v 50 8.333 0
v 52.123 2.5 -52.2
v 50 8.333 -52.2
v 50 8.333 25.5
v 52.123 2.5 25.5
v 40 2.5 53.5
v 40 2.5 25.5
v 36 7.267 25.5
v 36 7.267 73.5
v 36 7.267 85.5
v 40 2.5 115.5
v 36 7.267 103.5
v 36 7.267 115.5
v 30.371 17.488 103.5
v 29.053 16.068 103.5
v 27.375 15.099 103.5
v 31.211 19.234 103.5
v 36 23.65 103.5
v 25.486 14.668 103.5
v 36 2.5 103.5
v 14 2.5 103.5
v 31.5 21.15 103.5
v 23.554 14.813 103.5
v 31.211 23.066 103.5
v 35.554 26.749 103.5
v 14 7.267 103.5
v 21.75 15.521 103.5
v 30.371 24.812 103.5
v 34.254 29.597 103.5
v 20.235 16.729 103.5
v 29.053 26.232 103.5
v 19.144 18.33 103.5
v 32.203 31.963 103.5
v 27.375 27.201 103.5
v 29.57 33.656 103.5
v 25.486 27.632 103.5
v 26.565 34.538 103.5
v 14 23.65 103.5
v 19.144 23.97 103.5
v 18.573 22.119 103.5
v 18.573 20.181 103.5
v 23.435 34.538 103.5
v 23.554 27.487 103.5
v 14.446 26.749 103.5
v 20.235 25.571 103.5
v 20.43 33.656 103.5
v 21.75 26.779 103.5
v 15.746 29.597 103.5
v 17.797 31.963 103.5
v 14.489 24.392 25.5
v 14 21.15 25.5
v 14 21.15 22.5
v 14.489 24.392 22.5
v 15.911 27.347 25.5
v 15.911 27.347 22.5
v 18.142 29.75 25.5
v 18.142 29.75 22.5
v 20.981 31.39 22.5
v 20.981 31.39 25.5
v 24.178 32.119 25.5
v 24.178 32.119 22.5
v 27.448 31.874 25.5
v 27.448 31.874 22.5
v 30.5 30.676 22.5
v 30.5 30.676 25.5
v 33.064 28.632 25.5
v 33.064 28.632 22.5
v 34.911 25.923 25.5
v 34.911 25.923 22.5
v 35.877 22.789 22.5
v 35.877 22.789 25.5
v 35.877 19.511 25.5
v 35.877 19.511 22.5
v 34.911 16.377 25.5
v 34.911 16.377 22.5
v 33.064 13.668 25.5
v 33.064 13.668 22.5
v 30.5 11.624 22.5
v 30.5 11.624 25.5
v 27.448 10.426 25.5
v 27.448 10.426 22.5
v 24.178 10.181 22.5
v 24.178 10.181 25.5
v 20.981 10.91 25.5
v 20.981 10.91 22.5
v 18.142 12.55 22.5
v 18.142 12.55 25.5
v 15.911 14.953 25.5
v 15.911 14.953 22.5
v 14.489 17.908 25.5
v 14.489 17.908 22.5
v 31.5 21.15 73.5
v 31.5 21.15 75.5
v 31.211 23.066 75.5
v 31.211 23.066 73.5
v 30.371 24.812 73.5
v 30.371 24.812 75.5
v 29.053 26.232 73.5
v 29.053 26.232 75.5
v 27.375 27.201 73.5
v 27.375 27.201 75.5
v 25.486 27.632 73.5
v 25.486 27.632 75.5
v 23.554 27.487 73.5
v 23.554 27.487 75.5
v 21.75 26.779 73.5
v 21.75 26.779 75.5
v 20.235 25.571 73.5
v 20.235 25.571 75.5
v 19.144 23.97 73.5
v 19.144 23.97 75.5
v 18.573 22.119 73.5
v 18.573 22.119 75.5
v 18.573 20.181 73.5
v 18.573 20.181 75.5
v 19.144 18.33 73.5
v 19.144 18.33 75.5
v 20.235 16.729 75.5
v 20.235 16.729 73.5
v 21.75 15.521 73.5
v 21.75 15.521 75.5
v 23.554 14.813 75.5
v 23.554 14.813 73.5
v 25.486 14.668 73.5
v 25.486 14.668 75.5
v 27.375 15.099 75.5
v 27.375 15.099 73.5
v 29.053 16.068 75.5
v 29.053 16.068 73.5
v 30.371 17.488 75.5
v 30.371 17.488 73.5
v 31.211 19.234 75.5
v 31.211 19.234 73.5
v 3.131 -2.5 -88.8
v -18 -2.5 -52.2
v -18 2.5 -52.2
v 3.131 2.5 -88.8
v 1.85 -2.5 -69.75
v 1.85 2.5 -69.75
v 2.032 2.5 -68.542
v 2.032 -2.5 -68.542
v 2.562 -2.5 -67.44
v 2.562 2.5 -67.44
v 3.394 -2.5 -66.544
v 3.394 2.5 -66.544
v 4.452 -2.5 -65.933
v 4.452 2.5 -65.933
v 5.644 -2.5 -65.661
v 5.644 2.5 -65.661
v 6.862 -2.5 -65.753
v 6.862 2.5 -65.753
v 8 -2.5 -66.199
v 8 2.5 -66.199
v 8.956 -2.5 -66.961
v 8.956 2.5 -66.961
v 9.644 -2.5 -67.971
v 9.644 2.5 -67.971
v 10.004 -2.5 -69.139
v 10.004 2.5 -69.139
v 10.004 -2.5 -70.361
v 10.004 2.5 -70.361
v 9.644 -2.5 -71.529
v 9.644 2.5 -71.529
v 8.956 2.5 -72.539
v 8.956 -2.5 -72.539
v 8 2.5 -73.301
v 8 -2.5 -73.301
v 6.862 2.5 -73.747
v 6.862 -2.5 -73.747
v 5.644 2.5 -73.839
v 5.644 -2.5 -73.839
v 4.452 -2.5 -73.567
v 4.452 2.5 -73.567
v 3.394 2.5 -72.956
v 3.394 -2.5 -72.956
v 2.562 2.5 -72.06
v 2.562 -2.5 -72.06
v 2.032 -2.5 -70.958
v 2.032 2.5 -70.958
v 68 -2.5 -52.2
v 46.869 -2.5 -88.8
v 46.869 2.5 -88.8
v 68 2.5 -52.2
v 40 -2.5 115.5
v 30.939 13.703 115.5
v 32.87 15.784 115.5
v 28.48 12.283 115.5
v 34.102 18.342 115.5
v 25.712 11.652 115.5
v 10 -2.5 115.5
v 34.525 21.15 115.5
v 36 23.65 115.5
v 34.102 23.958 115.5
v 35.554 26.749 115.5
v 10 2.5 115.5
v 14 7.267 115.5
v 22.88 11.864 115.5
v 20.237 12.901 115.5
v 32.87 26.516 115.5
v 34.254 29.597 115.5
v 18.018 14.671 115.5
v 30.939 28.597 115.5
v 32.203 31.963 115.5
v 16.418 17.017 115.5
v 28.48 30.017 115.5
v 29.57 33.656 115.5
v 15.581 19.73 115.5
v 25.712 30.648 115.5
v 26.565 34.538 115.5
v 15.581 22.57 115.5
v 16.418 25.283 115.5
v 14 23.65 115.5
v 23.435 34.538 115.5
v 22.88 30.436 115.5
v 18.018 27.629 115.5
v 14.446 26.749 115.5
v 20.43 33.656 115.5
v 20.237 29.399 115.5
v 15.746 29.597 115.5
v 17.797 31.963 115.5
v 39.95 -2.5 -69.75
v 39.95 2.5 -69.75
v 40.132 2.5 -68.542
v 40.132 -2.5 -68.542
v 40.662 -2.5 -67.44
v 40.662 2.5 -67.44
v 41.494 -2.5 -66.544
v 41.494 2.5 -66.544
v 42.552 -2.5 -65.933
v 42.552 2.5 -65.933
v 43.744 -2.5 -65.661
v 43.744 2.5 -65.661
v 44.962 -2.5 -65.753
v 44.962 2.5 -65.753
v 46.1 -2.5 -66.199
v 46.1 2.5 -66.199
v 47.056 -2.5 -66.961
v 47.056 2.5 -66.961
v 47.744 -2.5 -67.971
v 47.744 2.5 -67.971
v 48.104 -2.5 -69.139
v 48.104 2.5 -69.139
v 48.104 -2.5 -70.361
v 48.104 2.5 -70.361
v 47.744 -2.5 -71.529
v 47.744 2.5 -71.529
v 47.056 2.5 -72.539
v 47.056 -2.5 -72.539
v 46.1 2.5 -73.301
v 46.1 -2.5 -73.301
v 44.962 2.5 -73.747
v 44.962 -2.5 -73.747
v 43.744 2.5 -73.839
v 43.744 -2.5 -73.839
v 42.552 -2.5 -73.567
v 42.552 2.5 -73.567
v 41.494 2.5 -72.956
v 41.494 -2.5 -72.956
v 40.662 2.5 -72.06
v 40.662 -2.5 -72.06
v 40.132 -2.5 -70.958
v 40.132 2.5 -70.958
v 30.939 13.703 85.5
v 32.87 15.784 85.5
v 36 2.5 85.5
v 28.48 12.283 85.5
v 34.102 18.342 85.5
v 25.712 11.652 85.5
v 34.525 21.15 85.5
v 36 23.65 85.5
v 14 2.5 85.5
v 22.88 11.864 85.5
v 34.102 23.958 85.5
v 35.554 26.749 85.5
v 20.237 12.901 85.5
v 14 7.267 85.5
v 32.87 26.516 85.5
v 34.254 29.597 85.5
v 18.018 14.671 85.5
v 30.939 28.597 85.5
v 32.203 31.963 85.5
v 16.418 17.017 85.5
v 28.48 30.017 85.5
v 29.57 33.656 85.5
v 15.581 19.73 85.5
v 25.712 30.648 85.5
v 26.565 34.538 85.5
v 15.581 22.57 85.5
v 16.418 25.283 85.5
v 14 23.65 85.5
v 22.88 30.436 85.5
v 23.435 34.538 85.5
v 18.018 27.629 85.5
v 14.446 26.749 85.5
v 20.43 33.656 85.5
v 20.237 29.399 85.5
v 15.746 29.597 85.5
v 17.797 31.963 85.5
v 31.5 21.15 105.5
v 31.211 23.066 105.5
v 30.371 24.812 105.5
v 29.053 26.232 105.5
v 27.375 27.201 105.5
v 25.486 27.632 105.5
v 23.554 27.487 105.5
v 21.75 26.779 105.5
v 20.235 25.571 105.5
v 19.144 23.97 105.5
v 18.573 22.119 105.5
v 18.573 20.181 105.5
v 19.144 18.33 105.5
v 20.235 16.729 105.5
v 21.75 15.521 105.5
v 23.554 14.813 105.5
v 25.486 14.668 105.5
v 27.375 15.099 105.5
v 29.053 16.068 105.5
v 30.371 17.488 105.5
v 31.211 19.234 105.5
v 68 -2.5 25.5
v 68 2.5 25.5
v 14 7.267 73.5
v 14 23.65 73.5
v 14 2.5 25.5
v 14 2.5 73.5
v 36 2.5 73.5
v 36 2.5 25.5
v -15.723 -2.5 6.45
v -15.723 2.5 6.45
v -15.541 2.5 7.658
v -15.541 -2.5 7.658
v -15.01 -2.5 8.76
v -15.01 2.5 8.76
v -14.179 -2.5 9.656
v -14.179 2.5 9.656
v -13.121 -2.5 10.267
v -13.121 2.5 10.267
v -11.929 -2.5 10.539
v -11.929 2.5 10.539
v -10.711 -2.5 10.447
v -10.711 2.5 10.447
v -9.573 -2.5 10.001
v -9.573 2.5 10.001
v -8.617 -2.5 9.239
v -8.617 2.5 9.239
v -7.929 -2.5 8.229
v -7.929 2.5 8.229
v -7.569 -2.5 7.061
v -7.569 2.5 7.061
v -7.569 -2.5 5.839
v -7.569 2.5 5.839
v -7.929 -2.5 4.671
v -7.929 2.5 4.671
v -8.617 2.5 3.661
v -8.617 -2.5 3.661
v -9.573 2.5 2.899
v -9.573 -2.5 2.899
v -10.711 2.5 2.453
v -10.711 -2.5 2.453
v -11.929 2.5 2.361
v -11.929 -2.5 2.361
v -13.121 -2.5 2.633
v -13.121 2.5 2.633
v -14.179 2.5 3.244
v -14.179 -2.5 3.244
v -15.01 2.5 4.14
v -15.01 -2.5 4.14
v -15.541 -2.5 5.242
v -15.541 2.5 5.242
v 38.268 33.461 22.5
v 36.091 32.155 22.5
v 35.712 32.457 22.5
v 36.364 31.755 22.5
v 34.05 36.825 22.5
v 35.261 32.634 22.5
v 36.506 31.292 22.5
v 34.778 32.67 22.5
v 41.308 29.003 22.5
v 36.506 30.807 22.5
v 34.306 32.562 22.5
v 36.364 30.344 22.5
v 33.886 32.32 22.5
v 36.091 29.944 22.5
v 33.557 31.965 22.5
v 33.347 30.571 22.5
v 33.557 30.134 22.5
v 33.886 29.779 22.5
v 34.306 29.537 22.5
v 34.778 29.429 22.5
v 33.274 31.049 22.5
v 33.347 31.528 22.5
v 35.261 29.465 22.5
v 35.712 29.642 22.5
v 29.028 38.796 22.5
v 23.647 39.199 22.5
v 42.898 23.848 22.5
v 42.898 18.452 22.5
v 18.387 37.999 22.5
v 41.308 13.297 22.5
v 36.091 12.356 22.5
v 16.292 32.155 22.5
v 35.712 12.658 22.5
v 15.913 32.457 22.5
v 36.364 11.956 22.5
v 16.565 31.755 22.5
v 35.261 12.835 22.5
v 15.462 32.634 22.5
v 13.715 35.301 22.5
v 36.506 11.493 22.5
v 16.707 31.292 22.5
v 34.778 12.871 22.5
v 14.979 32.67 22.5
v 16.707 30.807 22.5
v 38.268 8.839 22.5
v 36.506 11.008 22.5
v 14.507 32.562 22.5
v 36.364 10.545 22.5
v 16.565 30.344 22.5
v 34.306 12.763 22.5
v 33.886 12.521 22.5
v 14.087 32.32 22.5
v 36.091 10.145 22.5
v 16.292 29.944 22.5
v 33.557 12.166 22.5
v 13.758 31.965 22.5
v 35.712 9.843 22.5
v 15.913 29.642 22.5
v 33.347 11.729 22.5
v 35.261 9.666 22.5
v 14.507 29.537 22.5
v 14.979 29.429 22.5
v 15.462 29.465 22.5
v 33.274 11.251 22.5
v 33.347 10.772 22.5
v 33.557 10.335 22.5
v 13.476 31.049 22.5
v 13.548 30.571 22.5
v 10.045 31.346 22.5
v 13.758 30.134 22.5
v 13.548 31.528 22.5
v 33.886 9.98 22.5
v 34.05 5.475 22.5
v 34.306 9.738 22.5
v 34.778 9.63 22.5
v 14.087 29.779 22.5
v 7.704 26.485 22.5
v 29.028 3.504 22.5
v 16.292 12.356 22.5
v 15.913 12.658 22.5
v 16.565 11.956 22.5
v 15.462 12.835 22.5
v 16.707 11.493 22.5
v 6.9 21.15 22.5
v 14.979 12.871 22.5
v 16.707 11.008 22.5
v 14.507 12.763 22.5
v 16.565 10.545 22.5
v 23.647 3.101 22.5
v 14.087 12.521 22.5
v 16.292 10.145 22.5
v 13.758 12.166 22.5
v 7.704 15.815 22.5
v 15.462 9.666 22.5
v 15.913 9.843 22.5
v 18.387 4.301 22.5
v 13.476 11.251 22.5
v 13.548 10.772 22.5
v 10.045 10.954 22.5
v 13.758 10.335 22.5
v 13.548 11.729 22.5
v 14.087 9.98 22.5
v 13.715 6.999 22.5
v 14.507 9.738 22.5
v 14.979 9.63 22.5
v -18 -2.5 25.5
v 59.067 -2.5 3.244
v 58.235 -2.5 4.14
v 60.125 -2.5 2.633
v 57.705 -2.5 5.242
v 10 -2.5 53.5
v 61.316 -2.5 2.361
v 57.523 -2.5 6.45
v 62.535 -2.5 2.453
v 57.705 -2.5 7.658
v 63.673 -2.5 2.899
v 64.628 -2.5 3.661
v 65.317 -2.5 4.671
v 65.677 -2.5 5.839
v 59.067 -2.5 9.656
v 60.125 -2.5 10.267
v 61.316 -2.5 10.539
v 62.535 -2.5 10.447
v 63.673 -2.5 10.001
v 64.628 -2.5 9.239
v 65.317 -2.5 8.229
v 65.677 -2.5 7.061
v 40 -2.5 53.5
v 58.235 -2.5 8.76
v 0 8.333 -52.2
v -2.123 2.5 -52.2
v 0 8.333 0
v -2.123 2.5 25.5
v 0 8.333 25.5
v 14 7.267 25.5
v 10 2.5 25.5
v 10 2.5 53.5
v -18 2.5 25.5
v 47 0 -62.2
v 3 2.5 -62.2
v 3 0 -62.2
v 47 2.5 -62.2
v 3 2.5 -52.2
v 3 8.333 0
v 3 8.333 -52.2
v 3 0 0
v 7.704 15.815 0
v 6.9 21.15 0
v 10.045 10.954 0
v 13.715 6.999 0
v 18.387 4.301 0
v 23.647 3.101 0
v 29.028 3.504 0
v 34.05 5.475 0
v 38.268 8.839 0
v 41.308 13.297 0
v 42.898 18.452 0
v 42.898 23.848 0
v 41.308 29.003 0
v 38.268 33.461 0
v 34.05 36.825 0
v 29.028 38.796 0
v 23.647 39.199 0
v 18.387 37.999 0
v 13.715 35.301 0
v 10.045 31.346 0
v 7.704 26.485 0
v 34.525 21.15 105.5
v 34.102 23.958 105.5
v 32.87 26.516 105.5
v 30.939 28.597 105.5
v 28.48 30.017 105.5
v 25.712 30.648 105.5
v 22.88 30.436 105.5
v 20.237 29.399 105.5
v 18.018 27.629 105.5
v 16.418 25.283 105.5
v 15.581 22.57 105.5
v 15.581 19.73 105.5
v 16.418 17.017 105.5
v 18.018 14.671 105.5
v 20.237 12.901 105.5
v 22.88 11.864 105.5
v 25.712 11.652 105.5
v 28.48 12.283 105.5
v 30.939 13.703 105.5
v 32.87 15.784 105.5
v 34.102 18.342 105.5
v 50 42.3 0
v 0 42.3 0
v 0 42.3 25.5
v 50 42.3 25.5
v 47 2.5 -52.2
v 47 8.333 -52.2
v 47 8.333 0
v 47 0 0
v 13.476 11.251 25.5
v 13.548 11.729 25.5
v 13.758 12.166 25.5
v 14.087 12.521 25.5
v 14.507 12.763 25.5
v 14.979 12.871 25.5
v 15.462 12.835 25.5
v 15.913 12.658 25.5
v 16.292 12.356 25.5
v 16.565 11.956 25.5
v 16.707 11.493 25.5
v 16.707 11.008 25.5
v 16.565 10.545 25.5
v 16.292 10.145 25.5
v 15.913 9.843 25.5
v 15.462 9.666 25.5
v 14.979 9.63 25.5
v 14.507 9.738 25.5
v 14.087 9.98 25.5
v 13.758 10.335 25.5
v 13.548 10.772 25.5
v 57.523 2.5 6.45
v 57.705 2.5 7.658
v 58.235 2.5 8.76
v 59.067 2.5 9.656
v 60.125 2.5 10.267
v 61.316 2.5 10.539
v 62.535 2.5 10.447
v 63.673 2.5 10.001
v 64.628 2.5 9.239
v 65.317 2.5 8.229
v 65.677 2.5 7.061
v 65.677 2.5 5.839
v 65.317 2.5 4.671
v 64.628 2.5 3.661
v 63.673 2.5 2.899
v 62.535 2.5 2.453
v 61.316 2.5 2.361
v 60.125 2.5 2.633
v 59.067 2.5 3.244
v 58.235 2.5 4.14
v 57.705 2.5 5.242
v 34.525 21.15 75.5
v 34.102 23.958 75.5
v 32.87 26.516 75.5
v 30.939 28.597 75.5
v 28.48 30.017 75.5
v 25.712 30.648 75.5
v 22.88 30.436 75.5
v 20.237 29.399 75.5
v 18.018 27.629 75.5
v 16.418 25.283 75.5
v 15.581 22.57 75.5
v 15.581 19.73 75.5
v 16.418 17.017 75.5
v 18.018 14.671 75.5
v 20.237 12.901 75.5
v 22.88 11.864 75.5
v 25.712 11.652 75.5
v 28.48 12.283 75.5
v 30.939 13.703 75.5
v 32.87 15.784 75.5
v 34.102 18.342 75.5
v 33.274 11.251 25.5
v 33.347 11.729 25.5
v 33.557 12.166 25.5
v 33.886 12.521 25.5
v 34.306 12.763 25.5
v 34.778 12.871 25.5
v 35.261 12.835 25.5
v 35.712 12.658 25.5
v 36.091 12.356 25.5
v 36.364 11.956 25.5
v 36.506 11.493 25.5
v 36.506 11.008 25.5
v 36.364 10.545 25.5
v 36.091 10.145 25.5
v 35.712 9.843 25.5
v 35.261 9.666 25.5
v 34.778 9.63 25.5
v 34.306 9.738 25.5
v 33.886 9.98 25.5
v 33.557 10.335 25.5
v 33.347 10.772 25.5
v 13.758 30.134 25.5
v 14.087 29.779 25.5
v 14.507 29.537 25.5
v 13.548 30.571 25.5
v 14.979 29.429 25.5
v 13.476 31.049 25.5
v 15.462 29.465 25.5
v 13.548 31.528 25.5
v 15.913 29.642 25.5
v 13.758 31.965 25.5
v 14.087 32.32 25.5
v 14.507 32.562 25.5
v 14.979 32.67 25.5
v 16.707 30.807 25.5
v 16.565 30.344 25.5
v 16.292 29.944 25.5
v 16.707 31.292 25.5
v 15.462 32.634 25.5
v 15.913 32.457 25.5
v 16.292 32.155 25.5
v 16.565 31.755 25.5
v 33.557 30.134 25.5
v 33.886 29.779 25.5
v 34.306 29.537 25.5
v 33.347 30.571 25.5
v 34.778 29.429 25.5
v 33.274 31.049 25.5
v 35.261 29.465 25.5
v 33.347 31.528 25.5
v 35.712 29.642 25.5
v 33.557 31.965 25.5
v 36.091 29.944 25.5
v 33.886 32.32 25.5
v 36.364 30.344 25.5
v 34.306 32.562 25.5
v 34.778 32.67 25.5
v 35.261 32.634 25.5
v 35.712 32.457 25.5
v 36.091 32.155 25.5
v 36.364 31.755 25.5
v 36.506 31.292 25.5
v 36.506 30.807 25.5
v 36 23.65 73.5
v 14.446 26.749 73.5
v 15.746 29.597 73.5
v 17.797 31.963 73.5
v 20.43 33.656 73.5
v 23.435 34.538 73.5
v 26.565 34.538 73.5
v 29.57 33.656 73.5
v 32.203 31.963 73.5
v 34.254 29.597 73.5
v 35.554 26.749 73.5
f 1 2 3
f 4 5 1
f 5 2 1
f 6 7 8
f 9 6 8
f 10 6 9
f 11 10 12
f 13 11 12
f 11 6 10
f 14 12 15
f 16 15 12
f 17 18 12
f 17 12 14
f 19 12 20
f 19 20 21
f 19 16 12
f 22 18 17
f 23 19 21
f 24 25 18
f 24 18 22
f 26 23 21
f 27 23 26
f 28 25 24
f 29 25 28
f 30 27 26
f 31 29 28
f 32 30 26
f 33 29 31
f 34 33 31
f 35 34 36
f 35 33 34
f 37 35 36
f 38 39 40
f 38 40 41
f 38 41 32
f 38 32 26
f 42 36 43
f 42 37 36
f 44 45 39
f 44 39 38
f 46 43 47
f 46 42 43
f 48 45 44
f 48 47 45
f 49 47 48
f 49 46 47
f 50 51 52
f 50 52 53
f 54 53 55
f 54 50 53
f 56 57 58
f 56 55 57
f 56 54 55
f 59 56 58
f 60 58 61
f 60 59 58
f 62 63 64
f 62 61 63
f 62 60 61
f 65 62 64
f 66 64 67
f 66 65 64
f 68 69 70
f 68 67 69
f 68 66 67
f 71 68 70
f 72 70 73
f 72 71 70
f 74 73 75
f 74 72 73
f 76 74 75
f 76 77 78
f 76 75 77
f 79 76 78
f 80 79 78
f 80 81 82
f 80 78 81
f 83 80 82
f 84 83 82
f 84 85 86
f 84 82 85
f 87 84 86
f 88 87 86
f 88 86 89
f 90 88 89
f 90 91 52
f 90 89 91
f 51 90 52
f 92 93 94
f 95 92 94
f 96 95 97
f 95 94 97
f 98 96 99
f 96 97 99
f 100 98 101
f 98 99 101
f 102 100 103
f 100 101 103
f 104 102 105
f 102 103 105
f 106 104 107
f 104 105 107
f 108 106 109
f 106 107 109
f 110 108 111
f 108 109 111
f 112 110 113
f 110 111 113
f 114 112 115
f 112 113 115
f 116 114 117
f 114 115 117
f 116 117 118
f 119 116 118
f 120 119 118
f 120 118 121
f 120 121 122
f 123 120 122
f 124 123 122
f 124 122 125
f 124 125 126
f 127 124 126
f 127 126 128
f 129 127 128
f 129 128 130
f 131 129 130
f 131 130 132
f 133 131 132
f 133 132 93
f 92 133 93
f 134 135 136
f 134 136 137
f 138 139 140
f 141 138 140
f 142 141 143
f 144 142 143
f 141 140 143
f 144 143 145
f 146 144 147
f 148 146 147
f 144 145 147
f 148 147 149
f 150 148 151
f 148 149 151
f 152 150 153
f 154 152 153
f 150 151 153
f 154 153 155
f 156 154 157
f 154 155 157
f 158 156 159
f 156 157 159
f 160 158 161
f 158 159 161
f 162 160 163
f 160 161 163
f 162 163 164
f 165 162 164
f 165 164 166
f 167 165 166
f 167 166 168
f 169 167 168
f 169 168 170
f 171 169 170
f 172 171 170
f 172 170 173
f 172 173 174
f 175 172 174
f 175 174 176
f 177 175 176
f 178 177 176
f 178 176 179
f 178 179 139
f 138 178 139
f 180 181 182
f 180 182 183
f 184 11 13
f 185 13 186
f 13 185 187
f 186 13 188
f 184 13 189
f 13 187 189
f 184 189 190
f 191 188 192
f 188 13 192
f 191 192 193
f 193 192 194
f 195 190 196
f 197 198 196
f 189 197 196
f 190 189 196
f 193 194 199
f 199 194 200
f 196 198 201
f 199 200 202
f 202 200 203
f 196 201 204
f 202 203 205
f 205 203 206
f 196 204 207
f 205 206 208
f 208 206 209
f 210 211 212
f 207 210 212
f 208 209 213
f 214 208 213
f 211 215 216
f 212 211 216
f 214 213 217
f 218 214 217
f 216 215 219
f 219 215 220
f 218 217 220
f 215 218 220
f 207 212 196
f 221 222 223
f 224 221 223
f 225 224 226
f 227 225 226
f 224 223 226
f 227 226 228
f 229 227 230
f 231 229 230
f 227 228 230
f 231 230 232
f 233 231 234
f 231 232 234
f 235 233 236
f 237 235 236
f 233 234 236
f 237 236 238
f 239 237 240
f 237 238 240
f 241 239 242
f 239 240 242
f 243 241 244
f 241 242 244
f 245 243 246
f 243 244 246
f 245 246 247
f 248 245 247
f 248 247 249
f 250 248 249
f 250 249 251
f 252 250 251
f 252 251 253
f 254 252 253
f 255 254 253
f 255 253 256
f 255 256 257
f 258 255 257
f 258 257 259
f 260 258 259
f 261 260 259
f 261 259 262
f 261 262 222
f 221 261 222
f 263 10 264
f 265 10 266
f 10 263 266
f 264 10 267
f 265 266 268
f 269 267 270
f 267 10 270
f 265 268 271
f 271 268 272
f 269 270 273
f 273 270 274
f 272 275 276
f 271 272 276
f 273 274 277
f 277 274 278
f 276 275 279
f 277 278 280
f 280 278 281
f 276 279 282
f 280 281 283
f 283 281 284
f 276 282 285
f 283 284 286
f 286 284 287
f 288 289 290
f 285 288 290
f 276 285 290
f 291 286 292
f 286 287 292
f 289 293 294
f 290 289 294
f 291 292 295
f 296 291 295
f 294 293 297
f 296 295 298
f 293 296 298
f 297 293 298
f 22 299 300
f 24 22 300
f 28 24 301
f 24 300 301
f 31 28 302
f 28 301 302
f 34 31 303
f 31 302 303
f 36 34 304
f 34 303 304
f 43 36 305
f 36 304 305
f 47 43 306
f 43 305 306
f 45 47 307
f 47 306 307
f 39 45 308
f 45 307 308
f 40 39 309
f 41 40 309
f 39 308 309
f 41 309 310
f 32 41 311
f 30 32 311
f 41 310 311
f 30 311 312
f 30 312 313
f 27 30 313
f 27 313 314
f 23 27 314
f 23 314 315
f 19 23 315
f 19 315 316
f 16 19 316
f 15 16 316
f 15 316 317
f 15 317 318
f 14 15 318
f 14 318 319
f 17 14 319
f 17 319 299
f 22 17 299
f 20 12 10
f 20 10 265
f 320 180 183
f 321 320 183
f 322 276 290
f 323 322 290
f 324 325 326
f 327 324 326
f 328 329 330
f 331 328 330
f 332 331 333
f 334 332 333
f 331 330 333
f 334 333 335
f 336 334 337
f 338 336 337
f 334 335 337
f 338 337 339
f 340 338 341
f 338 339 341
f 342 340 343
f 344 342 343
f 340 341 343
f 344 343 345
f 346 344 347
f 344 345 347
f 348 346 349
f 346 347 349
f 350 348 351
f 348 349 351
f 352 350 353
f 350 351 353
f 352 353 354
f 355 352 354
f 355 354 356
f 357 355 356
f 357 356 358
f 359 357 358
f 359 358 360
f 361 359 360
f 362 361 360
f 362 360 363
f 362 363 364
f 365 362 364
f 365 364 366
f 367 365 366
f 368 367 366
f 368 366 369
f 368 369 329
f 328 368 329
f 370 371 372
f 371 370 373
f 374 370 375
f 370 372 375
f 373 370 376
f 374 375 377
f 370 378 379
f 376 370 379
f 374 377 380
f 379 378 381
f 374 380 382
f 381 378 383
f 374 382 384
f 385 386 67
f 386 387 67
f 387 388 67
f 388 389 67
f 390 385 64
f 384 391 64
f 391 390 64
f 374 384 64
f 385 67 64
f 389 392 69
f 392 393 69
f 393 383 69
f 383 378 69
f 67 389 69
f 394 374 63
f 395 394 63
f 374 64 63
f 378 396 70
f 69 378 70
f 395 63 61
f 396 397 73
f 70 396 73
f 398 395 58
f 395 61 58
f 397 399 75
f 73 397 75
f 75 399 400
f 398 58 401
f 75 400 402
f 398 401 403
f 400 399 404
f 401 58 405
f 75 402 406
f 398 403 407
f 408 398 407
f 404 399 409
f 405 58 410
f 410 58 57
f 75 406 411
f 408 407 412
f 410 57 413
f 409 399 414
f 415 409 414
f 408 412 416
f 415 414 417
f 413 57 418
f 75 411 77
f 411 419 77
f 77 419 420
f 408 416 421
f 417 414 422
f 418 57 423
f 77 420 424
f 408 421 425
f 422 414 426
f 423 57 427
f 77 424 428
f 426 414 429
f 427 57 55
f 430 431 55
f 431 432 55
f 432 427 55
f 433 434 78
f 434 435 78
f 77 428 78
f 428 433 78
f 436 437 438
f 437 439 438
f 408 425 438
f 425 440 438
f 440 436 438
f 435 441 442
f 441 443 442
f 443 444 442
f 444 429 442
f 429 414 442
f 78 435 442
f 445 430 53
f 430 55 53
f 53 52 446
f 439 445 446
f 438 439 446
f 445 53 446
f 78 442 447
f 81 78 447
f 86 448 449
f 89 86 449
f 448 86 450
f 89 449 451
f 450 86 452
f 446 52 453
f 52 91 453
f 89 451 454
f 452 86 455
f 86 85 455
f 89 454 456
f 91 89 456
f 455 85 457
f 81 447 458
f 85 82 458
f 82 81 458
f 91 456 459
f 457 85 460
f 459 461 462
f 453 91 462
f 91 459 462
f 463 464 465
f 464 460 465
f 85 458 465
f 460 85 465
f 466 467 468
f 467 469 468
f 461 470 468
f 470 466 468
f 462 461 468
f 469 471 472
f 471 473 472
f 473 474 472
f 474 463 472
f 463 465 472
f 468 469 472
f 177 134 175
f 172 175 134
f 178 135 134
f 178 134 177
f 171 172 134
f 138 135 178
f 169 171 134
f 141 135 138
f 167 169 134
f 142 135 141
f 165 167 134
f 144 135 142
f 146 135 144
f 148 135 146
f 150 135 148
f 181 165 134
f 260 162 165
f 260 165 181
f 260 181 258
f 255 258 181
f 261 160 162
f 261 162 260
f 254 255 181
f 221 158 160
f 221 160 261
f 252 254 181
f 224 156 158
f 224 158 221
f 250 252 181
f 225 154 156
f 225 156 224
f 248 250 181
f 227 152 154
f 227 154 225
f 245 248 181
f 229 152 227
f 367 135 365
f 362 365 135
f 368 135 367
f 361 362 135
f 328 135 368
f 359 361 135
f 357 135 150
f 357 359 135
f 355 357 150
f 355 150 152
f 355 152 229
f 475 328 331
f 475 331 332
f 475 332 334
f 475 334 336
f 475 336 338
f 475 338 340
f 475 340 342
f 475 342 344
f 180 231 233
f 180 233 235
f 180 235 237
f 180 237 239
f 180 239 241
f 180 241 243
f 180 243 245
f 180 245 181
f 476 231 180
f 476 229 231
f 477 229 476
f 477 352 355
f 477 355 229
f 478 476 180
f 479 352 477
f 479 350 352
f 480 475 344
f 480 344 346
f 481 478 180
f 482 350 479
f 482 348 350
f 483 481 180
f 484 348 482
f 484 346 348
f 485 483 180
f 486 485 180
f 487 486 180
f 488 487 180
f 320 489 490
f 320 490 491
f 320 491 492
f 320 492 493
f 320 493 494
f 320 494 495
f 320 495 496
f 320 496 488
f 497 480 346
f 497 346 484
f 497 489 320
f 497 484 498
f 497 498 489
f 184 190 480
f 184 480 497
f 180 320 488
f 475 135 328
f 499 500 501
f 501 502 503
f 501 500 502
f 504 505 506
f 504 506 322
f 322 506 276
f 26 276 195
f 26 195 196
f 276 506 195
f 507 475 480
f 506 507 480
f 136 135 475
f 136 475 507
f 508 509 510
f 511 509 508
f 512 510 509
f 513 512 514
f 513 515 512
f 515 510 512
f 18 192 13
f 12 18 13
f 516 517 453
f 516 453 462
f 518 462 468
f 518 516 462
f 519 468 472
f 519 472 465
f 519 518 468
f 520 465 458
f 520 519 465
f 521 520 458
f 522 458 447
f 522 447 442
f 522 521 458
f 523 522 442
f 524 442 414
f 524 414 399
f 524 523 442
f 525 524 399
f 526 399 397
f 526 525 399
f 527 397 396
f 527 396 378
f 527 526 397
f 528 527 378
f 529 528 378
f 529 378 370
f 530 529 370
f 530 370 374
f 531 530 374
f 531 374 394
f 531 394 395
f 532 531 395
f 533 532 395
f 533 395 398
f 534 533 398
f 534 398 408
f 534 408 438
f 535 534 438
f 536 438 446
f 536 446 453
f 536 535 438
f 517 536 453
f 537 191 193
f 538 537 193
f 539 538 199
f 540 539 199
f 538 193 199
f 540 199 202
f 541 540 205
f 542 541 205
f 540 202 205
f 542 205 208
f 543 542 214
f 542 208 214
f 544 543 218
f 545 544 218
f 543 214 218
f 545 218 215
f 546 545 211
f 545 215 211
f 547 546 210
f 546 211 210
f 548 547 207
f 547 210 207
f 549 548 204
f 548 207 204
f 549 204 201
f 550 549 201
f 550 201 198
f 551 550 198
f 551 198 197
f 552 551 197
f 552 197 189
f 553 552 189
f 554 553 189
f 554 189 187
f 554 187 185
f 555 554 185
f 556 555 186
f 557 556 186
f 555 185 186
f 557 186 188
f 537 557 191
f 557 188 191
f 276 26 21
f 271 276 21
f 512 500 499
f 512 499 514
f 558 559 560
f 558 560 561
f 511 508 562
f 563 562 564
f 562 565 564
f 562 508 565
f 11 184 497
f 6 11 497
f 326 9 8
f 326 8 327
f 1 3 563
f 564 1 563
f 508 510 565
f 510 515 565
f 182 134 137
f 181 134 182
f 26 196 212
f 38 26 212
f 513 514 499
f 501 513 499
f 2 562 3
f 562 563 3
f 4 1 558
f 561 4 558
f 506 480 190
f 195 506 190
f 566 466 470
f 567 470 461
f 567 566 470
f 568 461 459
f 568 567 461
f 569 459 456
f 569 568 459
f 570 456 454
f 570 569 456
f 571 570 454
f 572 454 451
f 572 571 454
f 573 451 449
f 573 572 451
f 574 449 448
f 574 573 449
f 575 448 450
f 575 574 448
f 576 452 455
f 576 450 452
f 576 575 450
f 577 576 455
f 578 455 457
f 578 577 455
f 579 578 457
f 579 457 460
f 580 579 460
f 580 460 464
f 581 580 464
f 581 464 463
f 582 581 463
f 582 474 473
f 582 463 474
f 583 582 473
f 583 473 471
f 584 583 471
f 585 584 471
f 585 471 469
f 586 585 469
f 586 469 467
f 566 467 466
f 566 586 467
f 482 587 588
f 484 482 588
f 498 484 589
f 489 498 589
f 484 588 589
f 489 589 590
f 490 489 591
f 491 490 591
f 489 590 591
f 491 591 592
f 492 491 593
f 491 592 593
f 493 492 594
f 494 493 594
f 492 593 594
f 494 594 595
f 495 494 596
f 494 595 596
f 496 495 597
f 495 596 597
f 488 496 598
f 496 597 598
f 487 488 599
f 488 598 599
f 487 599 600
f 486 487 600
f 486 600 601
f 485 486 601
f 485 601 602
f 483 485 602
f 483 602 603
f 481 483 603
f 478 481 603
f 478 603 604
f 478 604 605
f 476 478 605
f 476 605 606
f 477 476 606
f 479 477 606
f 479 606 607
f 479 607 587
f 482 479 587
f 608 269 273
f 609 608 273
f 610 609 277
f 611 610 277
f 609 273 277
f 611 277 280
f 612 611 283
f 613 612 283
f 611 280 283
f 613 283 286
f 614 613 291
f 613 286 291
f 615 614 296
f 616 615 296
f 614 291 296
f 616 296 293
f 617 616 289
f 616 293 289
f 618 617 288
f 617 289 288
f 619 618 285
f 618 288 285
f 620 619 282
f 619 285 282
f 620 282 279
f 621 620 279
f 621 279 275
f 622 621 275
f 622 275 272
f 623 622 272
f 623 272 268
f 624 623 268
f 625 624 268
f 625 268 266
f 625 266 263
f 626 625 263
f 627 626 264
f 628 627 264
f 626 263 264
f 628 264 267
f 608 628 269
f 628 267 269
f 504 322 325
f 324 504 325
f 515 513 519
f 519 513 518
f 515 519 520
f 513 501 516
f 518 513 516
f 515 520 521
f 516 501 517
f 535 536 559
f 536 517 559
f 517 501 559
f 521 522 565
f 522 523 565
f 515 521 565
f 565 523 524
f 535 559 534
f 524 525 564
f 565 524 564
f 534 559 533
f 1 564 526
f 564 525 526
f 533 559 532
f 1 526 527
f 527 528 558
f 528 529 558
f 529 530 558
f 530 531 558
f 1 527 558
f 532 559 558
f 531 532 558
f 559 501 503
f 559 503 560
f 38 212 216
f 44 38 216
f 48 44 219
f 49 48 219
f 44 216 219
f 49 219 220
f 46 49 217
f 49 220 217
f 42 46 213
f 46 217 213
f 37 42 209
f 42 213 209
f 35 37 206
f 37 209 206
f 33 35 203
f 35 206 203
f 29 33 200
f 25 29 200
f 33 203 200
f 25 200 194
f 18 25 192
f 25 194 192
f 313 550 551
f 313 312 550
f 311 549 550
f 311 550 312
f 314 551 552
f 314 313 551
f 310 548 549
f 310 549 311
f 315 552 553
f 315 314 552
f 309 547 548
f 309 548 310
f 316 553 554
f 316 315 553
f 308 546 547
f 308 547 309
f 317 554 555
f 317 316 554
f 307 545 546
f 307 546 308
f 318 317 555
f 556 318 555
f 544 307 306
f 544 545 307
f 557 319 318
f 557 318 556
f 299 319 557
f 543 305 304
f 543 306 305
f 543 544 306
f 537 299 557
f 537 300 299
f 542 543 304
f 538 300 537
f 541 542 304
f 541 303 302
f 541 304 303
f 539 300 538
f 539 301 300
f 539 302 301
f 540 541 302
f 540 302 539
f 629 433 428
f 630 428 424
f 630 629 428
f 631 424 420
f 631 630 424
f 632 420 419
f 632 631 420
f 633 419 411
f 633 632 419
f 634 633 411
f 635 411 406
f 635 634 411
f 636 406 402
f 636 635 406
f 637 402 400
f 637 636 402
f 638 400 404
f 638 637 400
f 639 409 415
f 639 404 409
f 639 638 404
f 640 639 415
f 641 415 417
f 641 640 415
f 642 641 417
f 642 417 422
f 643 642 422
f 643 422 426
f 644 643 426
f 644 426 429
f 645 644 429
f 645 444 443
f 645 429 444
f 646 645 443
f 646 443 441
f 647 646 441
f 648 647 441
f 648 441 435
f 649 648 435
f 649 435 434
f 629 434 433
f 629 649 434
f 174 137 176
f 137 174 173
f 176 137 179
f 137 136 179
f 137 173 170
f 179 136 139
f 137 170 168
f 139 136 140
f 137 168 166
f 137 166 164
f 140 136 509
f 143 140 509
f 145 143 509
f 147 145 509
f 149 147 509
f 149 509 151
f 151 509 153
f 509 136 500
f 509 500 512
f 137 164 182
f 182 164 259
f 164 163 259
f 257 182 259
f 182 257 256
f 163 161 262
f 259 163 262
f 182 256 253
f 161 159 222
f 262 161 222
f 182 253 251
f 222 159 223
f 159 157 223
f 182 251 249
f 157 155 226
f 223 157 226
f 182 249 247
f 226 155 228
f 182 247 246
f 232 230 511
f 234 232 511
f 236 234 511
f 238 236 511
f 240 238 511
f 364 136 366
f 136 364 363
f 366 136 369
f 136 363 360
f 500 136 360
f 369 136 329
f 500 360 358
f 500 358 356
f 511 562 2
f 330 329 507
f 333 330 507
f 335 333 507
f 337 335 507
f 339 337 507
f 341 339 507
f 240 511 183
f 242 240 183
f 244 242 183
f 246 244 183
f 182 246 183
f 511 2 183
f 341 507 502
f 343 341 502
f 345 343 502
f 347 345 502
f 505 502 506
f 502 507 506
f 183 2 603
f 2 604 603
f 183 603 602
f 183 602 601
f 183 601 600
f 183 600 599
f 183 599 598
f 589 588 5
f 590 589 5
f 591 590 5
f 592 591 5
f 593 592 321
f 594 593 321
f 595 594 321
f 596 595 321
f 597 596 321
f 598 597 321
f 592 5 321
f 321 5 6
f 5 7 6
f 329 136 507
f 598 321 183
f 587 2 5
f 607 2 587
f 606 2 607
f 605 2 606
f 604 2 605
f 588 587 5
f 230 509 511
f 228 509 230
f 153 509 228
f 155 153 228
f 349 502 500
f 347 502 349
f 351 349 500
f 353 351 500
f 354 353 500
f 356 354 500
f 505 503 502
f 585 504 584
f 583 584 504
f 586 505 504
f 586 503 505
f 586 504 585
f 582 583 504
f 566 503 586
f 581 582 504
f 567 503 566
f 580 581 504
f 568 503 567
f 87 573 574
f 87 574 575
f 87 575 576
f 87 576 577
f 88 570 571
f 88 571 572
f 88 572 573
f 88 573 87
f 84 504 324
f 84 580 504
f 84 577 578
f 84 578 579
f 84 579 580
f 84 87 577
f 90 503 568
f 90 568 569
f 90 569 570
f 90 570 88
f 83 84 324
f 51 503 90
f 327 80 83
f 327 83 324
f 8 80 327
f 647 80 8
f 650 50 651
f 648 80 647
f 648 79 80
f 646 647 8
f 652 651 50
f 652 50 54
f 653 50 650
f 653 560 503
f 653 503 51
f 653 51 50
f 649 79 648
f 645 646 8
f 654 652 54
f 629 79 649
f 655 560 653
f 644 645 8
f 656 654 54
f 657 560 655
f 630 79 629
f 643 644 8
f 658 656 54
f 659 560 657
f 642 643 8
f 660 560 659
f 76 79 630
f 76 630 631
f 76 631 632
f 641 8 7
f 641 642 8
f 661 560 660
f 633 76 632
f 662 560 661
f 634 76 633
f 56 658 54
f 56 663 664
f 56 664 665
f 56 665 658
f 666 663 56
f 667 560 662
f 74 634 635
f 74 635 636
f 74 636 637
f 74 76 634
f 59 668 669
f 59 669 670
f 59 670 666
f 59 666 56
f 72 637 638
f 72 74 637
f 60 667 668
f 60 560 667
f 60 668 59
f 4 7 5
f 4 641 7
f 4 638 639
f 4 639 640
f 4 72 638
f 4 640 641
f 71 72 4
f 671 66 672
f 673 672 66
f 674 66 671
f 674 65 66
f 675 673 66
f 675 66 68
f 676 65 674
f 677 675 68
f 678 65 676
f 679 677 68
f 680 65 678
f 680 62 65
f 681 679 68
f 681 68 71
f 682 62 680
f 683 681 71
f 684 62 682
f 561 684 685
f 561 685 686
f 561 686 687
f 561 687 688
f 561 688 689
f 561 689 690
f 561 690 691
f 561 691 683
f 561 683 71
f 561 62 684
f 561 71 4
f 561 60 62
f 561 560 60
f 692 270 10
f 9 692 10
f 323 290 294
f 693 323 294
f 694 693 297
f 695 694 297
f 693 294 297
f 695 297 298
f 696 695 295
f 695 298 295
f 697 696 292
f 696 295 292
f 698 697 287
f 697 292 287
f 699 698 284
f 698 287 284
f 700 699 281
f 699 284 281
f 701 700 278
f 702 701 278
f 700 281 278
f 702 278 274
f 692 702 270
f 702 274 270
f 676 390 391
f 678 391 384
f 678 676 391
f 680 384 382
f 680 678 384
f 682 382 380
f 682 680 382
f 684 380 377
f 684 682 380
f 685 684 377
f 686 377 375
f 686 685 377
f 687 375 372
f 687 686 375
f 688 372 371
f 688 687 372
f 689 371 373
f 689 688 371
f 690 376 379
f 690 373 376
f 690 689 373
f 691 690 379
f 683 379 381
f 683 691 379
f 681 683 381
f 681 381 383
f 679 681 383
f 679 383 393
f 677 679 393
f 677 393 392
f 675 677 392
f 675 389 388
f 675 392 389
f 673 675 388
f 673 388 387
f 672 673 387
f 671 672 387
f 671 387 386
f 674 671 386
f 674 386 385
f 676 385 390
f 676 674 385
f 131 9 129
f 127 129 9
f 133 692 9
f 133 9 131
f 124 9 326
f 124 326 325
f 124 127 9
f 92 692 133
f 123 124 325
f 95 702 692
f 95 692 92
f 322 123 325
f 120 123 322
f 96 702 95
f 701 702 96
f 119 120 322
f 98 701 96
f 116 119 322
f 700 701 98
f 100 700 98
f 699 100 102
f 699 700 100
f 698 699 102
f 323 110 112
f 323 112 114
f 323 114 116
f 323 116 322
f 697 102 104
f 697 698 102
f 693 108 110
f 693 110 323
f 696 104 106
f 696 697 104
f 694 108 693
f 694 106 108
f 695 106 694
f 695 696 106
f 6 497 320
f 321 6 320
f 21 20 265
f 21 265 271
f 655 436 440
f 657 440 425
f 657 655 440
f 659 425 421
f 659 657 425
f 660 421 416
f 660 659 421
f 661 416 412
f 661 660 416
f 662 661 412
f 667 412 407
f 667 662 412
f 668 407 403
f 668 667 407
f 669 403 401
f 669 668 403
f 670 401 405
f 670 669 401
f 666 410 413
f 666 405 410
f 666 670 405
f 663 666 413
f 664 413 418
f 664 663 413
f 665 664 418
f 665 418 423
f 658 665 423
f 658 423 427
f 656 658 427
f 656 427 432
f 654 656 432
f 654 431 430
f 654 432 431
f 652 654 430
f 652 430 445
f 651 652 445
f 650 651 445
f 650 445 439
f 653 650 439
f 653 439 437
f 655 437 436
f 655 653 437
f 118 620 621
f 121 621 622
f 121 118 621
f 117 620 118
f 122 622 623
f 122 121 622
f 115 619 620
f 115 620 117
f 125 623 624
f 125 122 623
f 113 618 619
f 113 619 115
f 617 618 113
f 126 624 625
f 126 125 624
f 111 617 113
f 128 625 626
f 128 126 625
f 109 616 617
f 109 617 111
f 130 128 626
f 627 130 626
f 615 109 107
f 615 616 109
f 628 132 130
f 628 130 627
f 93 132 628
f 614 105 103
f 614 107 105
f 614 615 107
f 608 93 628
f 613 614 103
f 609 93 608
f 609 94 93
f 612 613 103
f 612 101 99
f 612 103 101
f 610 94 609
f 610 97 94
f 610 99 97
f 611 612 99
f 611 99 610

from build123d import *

# Parameters (mm, degrees)
ESQUISSE1_W                  = 50
ESQUISSE1_H                  = 42.3
BOSS_EXTRU_1_DEPTH           = 25.5
ESQUISSE4_R                  = 18.1
ENL_V_MAT_EXTRU_3_DEPTH      = 22.5
ENL_V_MAT_EXTRU_4_DEPTH      = 62.713369702
ENL_V_MAT_EXTRU_4_DEPTH_BACK = 62.713369702
ESQUISSE5_R                  = 11
ESQUISSE6_R                  = 1.625
ENL_V_MAT_EXTRU_5_DEPTH      = 10
BOSS_EXTRU_2_DEPTH           = 77.7
ESQUISSE16_W                 = 3
ESQUISSE16_H                 = 8.332527472
BOSS_EXTRU_4_DEPTH           = 52.2
ESQUISSE17_W                 = 86
ESQUISSE17_H                 = 2.5
BOSS_EXTRU_5_DEPTH           = 77.7
BOSS_EXTRU_7_DEPTH           = 5
BOSS_EXTRU_8_DEPTH           = 12
ESQUISSE22_R                 = 9.525
ENL_V_MAT_EXTRU_6_DEPTH      = 10
R_P_TITION_LIN_AIRE2_COUNT   = 2
R_P_TITION_LIN_AIRE2_PITCH   = 30
ESQUISSE23_R                 = 6.5
ENL_V_MAT_EXTRU_7_DEPTH      = 177.868821447
BOSS_EXTRU_9_DEPTH           = 5
ESQUISSE27_W                 = 44
ESQUISSE27_H                 = 2.5
ENL_V_MAT_EXTRU_9_DEPTH      = 10
ESQUISSE24_R                 = 4.1
ENL_V_MAT_EXTRU_8_DEPTH      = 140.81519946
BOSS_EXTRU_10_DEPTH          = 90


with BuildPart() as part:
    # Esquisse1 → Boss.-Extru.1 (new body)
    with BuildSketch(Plane.XY):
        with Locations((25, 21.15)):
            Rectangle(ESQUISSE1_W, ESQUISSE1_H)
    extrude(amount=BOSS_EXTRU_1_DEPTH)

    # Esquisse4 → Enlèv. mat.-Extru.3 (cut)
    with BuildSketch(Plane.XY):
        with Locations(Location((25, 21.15, 0), (0, 0, 180))):
            Circle(ESQUISSE4_R)
    extrude(amount=ENL_V_MAT_EXTRU_3_DEPTH, mode=Mode.SUBTRACT)

    # Esquisse5 → Enlèv. mat.-Extru.4 (cut, two sides: drawn at the far end of the back side and taken through both)
    with BuildSketch(Plane(origin=(37, 0, 25.5), x_dir=(-1, 0, 0), z_dir=(0, 0, -1)).offset(-ENL_V_MAT_EXTRU_4_DEPTH_BACK)):
        with Locations((12, 21.15)):
            Circle(ESQUISSE5_R)
    extrude(amount=ENL_V_MAT_EXTRU_4_DEPTH + ENL_V_MAT_EXTRU_4_DEPTH_BACK, mode=Mode.SUBTRACT)

    # Esquisse6 → Enlèv. mat.-Extru.5 (cut)
    with BuildSketch(Plane(origin=(0, 0, 25.5), x_dir=(-1, 0, 0), z_dir=(0, 0, -1))):
        with Locations((-34.899494937, 31.049494937)):
            Circle(ESQUISSE6_R)
        with Locations((-15.100505063, 31.049494937)):
            Circle(ESQUISSE6_R)
        with Locations((-15.100505063, 11.250505063)):
            Circle(ESQUISSE6_R)
        with Locations((-34.899494937, 11.250505063)):
            Circle(ESQUISSE6_R)
    extrude(amount=ENL_V_MAT_EXTRU_5_DEPTH, mode=Mode.SUBTRACT)

    # Esquisse7 → Boss.-Extru.2 (add)
    with BuildSketch(Plane.XY.offset(25.5)):
        Polygon((50, 0), (68, 0), (68, 2.5), (52.12286639, 2.5), (50, 8.332527472), align=None)
        Polygon((-18, 0), (-18, 2.5), (-2.12286639, 2.5), (0, 8.332527472), (0, 0), align=None)
    extrude(amount=-BOSS_EXTRU_2_DEPTH)

    # Esquisse16 → Boss.-Extru.4 (add)
    with BuildSketch(Plane(origin=(0, 0, 0), x_dir=(-1, 0, 0), z_dir=(0, 0, -1))):
        with Locations((-1.5, 4.166263736)):
            Rectangle(ESQUISSE16_W, ESQUISSE16_H)
        with Locations((-48.5, 4.166263736)):
            Rectangle(ESQUISSE16_W, ESQUISSE16_H)
    extrude(amount=BOSS_EXTRU_4_DEPTH)

    # Esquisse17 → Boss.-Extru.5 (add)
    with BuildSketch(Plane.XY.offset(25.5)):
        with Locations((25, -1.25)):
            Rectangle(ESQUISSE17_W, ESQUISSE17_H)
    extrude(amount=-BOSS_EXTRU_5_DEPTH)

    # Esquisse20 → Boss.-Extru.7 (add)
    with BuildSketch(Plane.XZ.offset(2.5)):
        Polygon((-18, 25.5), (10, 53.5), (10, 115.5), (40, 115.5), (40, 53.5), (68, 25.5), align=None)
    extrude(amount=-BOSS_EXTRU_7_DEPTH)

    # Esquisse21 → Boss.-Extru.8 (add)
    with BuildSketch(Plane.XY.offset(115.5)):
        with BuildLine():
            Line((10, 2.5), (14, 7.26701437))
            Line((14, 7.26701437), (14, 23.65))
            ThreePointArc((14, 23.65), (25, 34.65), (36, 23.65))
            Line((36, 23.65), (36, 7.26701437))
            Line((36, 7.26701437), (40, 2.5))
            Line((40, 2.5), (10, 2.5))
        make_face()
    boss_extru_8 = extrude(amount=-BOSS_EXTRU_8_DEPTH)

    # Esquisse22 → Enlèv. mat.-Extru.6 (cut)
    with BuildSketch(Plane.XY.offset(115.5)):
        with Locations((25, 21.15)):
            Circle(ESQUISSE22_R)
    enl_v_mat_extru_6 = extrude(amount=-ENL_V_MAT_EXTRU_6_DEPTH, mode=Mode.SUBTRACT)

    # Répétition linéaire2: Boss.-Extru.8, Enlèv. mat.-Extru.6 ×2
    with Locations(*[(0, 0, -i * R_P_TITION_LIN_AIRE2_PITCH) for i in range(1, R_P_TITION_LIN_AIRE2_COUNT)]):
        add(boss_extru_8)
        add(enl_v_mat_extru_6, mode=Mode.SUBTRACT)

    # Esquisse23 → Enlèv. mat.-Extru.7 (cut, through all)
    with BuildSketch(Plane.XY.offset(105.5)):
        with Locations((25, 21.15)):
            Circle(ESQUISSE23_R)
    extrude(amount=-ENL_V_MAT_EXTRU_7_DEPTH, mode=Mode.SUBTRACT)

    # Esquisse26 → Boss.-Extru.9 (add)
    with BuildSketch(Plane.XZ.offset(2.5)):
        Polygon((-18, -52.2), (3.131019852, -88.8), (46.868980148, -88.8), (68, -52.2), align=None)
    extrude(amount=-BOSS_EXTRU_9_DEPTH)

    # Esquisse27 → Enlèv. mat.-Extru.9 (cut)
    with BuildSketch(Plane.XY.offset(-52.2)):
        with Locations((25, 1.25)):
            Rectangle(ESQUISSE27_W, ESQUISSE27_H)
    extrude(amount=-ENL_V_MAT_EXTRU_9_DEPTH, mode=Mode.SUBTRACT)

    # Esquisse24 → Enlèv. mat.-Extru.8 (cut, through all)
    with BuildSketch(Plane(origin=(0, 2.5, 0), x_dir=(1, 0, 0), z_dir=(0, 1, 0))):
        with Locations(Location((61.62286639, -6.45, 0), (0, 0, 180))):
            Circle(ESQUISSE24_R)
        with Locations(Location((-11.62286639, -6.45, 0), (0, 0, 180))):
            Circle(ESQUISSE24_R)
        with Locations(Location((5.95, 69.75, 0), (0, 0, 180))):
            Circle(ESQUISSE24_R)
        with Locations(Location((44.05, 69.75, 0), (0, 0, 180))):
            Circle(ESQUISSE24_R)
    extrude(amount=-ENL_V_MAT_EXTRU_8_DEPTH, mode=Mode.SUBTRACT)

    # Esquisse28 → Boss.-Extru.10 (add)
    with BuildSketch(Plane.XY.offset(115.5)):
        Polygon((14, 7.26701437), (14, 2.5), (10, 2.5), align=None)
        Polygon((36, 7.26701437), (36, 2.5), (40, 2.5), align=None)
    extrude(amount=-BOSS_EXTRU_10_DEPTH)


solid = part.part
